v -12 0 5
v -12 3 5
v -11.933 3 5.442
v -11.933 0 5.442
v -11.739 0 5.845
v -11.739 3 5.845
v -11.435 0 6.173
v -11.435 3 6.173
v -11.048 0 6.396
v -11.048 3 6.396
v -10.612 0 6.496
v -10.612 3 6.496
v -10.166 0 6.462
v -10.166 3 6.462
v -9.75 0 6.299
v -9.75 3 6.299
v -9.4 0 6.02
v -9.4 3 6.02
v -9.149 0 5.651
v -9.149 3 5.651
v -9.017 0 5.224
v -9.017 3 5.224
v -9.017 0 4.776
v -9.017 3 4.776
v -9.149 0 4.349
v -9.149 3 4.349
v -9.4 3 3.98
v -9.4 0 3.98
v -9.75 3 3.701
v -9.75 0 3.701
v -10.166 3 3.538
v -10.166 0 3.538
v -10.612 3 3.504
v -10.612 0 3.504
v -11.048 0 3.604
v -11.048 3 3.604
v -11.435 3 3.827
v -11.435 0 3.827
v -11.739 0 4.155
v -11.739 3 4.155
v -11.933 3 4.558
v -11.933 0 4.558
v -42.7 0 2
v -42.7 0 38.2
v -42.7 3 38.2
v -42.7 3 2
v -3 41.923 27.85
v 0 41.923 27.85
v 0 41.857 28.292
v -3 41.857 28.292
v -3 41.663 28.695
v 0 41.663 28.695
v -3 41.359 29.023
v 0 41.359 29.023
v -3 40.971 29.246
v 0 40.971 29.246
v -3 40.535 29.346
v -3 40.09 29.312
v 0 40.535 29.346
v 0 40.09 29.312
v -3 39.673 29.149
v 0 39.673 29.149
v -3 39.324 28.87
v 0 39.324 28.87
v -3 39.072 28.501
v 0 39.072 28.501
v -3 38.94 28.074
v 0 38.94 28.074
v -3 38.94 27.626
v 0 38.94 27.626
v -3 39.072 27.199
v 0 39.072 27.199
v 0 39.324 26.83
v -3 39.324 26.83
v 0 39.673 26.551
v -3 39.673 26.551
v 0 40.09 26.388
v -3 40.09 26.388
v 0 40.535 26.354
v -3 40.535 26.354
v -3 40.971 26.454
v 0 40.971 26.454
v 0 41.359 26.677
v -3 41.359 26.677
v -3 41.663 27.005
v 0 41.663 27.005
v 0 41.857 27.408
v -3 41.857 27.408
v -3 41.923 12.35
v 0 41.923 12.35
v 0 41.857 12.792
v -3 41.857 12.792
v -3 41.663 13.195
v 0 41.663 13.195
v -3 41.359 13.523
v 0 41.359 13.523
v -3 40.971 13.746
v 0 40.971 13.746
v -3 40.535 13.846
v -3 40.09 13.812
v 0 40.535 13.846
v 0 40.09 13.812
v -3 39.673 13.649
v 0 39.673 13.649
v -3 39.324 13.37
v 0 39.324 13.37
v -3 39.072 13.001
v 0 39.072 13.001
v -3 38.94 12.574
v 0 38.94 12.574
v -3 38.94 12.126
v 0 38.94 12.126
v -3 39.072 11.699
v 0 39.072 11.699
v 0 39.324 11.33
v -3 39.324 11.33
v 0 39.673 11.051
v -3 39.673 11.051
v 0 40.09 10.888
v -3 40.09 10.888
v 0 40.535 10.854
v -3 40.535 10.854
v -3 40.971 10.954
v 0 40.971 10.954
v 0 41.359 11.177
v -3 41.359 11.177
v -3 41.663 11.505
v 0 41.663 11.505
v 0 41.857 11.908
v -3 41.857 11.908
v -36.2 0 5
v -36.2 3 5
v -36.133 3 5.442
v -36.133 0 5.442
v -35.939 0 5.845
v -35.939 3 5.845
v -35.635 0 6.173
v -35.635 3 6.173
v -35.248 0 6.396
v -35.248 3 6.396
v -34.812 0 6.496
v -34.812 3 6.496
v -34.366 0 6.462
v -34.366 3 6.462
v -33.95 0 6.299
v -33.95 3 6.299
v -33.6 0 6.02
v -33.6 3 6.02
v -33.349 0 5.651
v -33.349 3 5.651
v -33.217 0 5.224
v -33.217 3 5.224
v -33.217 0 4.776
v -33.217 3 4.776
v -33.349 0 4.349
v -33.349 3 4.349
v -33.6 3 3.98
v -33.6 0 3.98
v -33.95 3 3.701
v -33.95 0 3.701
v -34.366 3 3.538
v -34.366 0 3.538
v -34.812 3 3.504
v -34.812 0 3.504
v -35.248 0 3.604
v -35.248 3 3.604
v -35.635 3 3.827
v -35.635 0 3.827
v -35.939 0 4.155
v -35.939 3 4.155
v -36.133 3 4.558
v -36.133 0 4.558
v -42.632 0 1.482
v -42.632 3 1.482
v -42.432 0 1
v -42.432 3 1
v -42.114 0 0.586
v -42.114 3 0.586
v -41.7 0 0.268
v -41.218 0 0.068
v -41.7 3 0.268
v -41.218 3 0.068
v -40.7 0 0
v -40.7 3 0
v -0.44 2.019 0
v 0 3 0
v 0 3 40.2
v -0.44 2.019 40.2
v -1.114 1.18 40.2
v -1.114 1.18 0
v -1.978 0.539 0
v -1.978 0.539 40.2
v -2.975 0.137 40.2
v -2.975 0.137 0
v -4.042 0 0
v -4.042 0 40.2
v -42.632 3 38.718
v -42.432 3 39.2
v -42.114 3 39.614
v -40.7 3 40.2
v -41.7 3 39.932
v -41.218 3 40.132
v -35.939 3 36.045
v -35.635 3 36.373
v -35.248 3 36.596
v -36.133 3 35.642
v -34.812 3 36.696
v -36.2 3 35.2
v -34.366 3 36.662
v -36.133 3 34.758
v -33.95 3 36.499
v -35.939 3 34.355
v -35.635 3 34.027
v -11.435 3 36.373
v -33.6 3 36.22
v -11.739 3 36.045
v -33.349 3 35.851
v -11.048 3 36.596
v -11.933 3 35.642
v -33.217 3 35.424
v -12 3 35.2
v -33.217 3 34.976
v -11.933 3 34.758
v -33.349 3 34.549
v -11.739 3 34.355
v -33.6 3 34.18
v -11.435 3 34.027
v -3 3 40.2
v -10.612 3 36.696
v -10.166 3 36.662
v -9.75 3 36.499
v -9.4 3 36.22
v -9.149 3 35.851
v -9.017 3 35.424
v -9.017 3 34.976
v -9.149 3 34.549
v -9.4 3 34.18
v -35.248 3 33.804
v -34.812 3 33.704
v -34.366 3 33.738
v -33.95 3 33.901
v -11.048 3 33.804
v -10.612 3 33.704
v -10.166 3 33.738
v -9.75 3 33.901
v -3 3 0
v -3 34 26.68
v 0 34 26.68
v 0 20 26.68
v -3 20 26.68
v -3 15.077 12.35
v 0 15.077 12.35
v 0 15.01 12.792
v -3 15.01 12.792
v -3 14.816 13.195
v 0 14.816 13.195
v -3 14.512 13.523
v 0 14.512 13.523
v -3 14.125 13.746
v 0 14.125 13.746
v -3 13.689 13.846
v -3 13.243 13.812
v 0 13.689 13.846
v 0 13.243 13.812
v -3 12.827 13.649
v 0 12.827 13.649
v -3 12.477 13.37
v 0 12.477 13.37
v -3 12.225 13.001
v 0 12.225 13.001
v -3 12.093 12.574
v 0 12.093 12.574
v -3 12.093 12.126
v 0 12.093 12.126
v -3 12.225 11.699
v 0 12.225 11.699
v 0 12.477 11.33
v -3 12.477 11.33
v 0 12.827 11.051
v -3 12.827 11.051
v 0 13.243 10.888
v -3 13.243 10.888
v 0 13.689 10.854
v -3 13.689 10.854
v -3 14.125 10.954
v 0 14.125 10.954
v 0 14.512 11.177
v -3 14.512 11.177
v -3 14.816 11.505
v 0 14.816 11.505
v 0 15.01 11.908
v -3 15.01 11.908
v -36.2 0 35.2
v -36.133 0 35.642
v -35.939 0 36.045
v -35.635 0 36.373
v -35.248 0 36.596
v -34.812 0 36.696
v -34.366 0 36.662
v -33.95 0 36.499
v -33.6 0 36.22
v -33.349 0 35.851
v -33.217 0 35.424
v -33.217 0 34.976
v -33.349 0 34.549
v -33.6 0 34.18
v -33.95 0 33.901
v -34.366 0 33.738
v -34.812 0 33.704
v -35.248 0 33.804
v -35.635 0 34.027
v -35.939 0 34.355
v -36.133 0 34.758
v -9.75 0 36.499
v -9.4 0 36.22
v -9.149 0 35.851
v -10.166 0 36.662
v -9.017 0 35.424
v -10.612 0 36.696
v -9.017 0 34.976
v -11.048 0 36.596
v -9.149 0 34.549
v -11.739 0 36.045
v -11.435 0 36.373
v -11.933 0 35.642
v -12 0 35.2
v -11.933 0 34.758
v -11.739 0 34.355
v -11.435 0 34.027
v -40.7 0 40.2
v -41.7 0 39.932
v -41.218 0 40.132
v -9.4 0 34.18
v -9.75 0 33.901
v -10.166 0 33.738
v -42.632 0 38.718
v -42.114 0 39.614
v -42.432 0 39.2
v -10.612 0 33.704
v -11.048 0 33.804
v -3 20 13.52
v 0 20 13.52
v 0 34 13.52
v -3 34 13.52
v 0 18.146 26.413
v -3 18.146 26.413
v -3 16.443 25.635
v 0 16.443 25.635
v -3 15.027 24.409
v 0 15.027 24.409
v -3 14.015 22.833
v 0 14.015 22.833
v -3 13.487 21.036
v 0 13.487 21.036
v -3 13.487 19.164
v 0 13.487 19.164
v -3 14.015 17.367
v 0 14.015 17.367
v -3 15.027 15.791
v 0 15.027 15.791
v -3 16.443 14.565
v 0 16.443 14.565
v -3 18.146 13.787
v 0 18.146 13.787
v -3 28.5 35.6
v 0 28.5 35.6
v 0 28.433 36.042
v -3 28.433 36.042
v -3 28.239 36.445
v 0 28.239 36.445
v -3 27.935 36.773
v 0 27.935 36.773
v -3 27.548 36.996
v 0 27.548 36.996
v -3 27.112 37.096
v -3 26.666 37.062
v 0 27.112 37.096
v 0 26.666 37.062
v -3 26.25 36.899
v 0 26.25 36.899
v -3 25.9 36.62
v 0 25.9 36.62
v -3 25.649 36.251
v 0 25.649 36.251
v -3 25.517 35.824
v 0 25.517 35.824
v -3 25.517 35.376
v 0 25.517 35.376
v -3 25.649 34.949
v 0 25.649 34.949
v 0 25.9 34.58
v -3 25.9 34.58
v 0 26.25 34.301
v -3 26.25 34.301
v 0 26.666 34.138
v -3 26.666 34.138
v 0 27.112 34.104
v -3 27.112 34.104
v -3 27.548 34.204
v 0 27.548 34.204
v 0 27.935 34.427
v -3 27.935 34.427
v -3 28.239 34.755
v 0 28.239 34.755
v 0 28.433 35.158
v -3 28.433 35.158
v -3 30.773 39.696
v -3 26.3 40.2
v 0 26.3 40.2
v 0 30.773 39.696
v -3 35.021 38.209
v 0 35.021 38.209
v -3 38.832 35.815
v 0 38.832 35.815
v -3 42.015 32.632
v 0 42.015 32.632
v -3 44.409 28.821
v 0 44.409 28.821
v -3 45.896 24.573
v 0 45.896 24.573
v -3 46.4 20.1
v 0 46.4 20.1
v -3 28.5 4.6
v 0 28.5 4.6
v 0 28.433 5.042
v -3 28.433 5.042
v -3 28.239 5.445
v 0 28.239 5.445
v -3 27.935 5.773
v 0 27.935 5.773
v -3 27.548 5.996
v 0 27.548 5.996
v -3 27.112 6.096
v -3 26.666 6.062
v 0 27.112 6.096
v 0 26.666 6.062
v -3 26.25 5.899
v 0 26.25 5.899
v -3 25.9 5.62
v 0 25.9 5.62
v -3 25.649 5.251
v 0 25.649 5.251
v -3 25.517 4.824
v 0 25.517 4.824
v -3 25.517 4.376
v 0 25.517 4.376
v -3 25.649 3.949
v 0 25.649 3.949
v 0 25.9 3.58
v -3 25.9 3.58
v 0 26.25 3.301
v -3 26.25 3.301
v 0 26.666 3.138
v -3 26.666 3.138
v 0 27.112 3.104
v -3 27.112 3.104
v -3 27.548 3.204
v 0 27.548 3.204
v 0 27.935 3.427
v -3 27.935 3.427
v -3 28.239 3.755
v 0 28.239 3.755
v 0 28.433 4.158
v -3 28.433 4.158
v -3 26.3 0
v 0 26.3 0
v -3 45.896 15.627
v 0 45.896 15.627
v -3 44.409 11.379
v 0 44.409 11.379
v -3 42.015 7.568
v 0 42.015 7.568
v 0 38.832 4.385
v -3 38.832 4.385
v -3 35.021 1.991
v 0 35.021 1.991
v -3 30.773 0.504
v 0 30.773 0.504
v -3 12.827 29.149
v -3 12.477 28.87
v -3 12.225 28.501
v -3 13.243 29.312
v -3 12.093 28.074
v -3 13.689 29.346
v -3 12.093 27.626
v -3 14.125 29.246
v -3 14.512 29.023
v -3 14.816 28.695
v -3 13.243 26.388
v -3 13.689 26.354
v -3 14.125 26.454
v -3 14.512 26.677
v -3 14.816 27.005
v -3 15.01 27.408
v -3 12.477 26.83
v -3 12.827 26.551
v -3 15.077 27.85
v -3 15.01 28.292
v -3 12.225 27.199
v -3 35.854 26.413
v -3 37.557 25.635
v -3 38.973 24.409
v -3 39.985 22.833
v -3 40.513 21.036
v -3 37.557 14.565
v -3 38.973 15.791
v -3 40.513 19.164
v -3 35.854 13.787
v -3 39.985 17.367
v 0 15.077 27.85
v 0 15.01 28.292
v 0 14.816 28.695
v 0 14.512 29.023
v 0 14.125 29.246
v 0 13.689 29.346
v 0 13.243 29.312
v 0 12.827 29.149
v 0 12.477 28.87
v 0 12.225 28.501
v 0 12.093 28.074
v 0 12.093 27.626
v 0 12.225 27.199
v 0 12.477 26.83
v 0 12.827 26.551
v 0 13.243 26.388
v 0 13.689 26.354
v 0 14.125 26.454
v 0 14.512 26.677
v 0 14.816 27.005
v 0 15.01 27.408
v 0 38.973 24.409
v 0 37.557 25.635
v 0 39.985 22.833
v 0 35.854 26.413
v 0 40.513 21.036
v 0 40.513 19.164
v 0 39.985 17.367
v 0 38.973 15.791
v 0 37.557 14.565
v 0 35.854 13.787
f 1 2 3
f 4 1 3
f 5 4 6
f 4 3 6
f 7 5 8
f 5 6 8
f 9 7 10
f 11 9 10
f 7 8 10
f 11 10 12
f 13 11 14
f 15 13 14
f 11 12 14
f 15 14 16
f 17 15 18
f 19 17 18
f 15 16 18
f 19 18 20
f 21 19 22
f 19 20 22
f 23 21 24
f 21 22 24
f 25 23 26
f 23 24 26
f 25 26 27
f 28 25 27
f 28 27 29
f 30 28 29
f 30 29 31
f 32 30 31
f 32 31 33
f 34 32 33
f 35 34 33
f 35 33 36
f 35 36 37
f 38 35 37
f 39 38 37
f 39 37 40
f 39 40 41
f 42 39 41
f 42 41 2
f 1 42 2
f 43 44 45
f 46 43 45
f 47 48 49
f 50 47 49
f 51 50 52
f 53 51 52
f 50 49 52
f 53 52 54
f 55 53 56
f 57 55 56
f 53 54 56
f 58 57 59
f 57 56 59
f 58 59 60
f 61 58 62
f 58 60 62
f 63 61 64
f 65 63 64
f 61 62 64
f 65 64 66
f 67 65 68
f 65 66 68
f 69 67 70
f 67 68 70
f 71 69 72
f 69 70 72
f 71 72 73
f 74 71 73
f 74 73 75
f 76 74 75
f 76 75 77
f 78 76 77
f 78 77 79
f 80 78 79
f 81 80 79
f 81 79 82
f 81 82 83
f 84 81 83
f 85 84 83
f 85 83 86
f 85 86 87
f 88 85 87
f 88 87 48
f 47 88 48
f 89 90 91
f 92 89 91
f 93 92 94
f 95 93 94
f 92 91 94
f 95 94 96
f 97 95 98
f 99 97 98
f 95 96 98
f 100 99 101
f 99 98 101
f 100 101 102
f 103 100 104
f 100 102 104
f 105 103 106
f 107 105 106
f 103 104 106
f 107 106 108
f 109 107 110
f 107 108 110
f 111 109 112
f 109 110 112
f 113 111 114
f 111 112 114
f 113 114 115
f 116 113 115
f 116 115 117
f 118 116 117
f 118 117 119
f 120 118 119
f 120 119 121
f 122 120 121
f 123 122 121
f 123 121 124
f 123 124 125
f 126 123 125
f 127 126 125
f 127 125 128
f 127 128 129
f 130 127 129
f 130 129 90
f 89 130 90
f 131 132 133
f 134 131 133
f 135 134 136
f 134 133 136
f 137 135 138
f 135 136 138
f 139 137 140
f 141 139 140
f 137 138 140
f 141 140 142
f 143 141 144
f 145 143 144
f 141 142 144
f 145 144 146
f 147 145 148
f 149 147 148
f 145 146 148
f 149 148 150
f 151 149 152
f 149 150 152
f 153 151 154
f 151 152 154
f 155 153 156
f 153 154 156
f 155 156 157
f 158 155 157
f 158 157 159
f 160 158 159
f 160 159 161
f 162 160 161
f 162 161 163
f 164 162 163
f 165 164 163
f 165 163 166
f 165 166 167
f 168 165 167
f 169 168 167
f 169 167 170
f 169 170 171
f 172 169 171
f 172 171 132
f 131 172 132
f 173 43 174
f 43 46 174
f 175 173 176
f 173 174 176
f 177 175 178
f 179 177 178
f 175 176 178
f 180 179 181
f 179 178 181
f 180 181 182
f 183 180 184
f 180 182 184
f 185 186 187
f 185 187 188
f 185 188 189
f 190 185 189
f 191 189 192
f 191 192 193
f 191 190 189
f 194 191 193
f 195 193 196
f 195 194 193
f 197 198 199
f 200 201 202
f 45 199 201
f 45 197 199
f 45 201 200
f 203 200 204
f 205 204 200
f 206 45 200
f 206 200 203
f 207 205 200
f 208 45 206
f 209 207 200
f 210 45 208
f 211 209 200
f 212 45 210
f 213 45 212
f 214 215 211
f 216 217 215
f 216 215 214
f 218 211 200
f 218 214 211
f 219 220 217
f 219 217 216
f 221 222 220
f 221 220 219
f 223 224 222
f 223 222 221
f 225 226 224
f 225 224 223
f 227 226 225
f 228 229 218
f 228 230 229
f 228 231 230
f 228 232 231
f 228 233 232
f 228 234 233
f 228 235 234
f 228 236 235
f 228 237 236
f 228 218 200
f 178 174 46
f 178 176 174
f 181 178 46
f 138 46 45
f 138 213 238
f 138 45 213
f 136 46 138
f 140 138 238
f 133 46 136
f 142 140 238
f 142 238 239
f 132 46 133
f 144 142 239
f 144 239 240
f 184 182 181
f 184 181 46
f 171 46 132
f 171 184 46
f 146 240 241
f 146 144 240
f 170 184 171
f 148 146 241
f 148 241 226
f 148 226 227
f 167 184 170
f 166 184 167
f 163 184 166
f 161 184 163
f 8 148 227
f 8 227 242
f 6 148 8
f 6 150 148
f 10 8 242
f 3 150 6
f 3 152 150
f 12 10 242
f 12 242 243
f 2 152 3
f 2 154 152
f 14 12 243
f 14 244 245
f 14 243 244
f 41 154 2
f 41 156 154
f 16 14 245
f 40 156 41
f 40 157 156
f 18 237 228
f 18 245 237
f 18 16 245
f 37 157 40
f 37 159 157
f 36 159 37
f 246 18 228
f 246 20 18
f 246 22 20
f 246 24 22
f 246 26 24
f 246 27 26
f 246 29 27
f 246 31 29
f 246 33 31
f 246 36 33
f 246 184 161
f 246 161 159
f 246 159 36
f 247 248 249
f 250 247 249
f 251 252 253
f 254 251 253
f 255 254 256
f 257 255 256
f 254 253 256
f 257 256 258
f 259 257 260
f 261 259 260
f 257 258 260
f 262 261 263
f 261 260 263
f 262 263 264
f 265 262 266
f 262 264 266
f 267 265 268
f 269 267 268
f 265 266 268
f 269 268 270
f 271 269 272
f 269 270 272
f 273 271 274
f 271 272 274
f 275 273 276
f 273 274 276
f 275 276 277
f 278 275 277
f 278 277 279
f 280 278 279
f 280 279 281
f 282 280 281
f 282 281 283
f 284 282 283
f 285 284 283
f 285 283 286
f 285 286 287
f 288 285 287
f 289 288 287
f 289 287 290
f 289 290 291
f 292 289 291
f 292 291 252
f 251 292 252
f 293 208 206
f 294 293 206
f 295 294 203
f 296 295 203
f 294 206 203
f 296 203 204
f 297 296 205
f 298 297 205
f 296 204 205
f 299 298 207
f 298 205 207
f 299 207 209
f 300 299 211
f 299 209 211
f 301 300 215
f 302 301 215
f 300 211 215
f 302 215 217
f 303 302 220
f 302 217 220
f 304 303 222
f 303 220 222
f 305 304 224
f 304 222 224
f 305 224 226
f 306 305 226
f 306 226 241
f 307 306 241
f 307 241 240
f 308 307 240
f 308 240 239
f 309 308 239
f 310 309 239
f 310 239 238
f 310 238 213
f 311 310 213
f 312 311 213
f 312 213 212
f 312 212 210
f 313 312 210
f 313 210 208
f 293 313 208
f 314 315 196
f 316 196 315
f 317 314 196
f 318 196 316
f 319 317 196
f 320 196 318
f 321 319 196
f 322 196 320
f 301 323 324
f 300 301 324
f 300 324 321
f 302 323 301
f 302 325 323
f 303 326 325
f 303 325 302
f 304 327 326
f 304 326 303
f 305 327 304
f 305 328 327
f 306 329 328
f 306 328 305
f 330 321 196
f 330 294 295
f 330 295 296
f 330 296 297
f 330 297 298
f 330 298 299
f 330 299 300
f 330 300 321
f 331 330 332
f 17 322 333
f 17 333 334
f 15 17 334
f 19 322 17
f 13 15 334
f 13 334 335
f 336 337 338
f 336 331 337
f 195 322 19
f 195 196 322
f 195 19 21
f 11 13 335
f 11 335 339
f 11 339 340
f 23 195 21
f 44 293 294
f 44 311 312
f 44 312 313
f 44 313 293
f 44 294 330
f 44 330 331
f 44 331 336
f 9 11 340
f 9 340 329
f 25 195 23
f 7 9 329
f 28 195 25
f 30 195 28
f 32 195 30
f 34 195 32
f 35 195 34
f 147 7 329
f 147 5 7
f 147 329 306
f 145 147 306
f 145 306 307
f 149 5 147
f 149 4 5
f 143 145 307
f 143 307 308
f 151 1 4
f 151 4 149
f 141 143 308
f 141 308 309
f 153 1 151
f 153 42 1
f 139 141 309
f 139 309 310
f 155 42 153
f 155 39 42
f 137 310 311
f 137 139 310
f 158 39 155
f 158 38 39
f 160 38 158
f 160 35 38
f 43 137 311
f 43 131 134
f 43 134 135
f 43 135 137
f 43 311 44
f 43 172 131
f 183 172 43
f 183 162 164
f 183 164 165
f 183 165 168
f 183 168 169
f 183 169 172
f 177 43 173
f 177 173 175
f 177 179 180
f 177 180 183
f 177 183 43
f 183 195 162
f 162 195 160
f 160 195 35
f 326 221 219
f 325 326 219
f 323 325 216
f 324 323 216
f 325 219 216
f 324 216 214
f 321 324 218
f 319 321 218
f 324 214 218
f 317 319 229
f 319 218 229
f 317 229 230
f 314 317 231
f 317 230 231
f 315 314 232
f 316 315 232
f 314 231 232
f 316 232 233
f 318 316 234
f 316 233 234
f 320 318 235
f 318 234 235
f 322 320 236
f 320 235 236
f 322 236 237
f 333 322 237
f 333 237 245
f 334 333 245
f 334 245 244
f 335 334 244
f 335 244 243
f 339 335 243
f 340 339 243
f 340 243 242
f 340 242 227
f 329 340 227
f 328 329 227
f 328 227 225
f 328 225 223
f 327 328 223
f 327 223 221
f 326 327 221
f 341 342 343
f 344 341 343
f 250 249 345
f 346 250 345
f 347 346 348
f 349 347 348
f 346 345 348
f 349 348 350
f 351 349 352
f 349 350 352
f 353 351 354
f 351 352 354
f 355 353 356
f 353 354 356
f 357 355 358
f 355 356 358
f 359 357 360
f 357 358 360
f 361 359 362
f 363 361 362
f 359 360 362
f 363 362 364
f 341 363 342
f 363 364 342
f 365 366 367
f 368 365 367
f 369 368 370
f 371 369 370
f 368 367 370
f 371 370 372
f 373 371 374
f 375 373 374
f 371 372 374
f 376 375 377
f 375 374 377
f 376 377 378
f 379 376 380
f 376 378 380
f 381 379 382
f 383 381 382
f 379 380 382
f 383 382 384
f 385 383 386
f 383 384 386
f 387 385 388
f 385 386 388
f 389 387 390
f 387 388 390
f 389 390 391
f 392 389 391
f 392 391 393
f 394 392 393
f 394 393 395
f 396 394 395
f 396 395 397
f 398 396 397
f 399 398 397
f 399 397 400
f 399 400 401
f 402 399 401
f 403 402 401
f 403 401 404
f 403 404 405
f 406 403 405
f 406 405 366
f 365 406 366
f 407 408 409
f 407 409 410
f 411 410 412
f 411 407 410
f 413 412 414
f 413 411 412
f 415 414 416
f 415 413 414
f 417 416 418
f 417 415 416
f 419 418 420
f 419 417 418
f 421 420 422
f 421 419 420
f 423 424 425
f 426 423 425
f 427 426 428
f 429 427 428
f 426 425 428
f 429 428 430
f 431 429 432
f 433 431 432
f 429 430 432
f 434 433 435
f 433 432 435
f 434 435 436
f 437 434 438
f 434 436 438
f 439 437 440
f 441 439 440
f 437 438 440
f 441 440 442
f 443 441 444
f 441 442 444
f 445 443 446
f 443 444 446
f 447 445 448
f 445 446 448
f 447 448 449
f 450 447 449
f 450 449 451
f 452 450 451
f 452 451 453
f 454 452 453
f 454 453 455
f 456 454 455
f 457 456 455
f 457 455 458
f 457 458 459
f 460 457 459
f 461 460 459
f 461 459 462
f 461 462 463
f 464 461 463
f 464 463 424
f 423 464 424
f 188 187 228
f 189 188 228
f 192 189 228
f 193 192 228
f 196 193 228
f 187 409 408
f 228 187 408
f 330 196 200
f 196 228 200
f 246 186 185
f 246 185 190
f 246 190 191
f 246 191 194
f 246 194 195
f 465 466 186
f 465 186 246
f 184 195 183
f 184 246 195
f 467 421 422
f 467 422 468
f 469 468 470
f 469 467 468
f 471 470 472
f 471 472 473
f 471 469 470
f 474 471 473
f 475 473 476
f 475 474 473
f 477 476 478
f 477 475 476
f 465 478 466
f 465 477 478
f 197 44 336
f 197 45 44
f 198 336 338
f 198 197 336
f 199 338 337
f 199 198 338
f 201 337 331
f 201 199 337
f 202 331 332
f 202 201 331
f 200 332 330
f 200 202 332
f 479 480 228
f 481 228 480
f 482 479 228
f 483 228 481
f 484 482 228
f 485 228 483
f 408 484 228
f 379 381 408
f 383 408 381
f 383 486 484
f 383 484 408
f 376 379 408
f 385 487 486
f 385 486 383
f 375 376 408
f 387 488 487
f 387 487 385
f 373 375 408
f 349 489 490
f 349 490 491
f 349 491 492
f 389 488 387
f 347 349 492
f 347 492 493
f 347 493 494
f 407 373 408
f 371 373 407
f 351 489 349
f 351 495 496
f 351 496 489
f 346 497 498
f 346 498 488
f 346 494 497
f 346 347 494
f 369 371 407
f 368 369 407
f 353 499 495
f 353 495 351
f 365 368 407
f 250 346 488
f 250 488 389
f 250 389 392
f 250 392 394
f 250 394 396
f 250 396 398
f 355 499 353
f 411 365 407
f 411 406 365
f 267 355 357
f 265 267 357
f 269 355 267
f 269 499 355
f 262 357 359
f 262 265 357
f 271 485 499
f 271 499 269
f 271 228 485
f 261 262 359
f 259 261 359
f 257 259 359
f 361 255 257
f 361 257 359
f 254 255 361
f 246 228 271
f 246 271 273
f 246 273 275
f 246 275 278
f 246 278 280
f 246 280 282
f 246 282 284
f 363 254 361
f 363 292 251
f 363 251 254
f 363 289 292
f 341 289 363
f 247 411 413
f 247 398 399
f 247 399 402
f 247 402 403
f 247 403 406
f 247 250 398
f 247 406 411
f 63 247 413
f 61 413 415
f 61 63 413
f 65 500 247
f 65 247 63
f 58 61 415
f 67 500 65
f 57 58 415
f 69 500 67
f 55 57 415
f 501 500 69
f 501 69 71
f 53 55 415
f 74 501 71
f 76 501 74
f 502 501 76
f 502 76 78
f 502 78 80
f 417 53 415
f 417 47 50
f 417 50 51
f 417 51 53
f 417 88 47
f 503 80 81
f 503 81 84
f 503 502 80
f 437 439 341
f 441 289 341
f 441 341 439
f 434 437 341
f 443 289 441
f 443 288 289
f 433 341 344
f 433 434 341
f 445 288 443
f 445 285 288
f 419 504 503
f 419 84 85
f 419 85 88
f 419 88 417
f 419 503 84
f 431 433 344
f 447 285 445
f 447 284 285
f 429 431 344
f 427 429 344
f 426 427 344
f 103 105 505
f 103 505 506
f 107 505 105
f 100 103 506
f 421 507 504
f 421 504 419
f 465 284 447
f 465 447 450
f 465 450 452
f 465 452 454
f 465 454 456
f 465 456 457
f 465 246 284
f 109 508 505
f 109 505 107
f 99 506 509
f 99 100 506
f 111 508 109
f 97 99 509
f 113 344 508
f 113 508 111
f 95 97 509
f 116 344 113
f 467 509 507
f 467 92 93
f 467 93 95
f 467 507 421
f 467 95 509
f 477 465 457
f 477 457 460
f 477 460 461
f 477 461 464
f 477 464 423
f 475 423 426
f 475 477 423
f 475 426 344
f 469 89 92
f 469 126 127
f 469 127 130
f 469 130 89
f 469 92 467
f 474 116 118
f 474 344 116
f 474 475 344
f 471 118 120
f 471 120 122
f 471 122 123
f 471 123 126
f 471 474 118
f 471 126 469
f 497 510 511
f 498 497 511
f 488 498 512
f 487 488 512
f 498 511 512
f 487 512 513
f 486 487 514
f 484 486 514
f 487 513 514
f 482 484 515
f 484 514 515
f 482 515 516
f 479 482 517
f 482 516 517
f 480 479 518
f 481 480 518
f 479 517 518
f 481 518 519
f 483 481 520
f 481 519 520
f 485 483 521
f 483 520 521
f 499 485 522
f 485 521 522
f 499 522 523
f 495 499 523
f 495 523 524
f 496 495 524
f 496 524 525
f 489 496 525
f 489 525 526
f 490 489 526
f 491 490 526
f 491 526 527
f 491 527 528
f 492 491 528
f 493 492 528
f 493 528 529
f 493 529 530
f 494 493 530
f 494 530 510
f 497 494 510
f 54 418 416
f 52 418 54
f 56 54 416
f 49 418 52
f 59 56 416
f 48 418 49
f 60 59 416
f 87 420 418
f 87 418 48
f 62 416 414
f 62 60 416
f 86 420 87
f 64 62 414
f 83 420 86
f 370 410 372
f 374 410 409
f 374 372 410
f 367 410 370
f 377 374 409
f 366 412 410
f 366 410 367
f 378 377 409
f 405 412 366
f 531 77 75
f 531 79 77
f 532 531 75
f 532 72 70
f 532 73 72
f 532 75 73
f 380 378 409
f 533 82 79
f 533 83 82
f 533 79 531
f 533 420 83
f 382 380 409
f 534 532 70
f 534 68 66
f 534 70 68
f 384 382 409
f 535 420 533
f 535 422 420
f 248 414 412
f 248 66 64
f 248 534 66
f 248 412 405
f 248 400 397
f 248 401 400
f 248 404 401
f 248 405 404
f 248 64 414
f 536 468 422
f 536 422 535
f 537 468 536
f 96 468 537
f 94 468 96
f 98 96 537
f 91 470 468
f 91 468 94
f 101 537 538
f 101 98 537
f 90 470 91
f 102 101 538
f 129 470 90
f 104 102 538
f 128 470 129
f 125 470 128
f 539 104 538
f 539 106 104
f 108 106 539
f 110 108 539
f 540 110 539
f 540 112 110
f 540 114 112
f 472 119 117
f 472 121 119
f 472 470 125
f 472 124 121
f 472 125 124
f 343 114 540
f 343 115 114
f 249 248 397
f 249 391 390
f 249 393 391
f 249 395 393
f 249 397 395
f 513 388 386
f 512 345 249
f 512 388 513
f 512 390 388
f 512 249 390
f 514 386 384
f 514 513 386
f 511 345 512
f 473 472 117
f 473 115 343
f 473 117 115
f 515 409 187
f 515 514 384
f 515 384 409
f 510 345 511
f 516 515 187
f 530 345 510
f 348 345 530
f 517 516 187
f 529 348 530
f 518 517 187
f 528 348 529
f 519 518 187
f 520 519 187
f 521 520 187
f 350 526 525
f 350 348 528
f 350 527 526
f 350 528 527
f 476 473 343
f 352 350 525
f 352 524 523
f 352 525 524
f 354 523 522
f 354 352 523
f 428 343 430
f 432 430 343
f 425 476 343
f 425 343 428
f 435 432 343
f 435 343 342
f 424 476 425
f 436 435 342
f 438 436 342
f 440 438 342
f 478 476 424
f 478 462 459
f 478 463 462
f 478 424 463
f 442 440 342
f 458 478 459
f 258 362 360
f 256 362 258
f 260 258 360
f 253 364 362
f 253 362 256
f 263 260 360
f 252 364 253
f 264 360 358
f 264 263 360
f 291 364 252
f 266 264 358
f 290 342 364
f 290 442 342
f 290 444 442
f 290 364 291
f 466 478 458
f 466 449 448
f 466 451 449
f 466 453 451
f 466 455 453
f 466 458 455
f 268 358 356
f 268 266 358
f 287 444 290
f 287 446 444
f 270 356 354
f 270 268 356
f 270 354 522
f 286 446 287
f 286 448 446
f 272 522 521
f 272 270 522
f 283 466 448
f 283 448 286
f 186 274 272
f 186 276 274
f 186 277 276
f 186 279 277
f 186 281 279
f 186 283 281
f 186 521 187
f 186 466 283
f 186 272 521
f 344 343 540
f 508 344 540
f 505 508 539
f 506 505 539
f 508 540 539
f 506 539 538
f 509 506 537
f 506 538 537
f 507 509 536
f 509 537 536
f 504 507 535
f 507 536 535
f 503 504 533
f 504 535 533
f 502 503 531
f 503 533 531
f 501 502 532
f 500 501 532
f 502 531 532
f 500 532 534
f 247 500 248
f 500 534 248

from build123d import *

# Parameters (mm, degrees)
BOSS_EXTRUDE1_DEPTH = 40.2
CUT_EXTRUDE1_START  = -3
CUT_EXTRUDE1_DEPTH  = 3
CUT_EXTRUDE4_DEPTH  = 40
SKETCH8_R           = 1.5
CUT_EXTRUDE5_DEPTH  = 40
FILLET2_R           = 2
SKETCH5_R           = 1.5
CUT_EXTRUDE6_DEPTH  = 73.958138682


# Read off the part's stored shape, not the designer's step: Cut-Extrude1
with BuildPart() as part:
    # Sketch1 → Boss-Extrude1 (new body)
    with BuildSketch(Plane.XY):
        with BuildLine():
            Line((-4.042288133, 0), (-42.7, 0))
            Line((-42.7, 0), (-42.7, 3))
            Line((-42.7, 3), (-3, 3))
            Line((-3, 3), (-3, 46.4))
            Line((-3, 46.4), (0, 46.4))
            Line((0, 46.4), (0, 3))
            ThreePointArc((0, 3), (-1.525340907, 0.831940258), (-4.042288133, 0))
        make_face()
    extrude(amount=BOSS_EXTRUDE1_DEPTH)

    # Cut-Extrude1 outline → Cut-Extrude1 (cut)
    with BuildSketch(Plane(origin=(0, 0, 0), x_dir=(0, 0, -1), z_dir=(1, 0, 0)).offset(CUT_EXTRUDE1_START)):
        with BuildLine():
            ThreePointArc((-40.2, 26.3), (-34.312846302, 40.512846302), (-20.1, 46.4))
            Line((-20.1, 46.4), (-40.2, 46.4))
            Line((-40.2, 46.4), (-40.2, 26.3))
        make_face()
        with BuildLine():
            ThreePointArc((-20.1, 46.4), (-5.887153698, 40.512846302), (0, 26.3))
            Line((0, 26.3), (0, 46.4))
            Line((0, 46.4), (-20.1, 46.4))
        make_face()
    extrude(amount=CUT_EXTRUDE1_DEPTH, mode=Mode.SUBTRACT)

    # Sketch7 → Cut-Extrude4 (cut)
    with BuildSketch(Plane(origin=(0, 0, 0), x_dir=(0, 0, -1), z_dir=(1, 0, 0))):
        with BuildLine():
            Line((-26.68, 34), (-26.68, 20))
            ThreePointArc((-26.68, 20), (-20.1, 13.42), (-13.52, 20))
            Line((-13.52, 20), (-13.52, 34))
            ThreePointArc((-13.52, 34), (-20.1, 40.58), (-26.68, 34))
        make_face()
    extrude(amount=-CUT_EXTRUDE4_DEPTH, mode=Mode.SUBTRACT)

    # Sketch8 → Cut-Extrude5 (cut)
    with BuildSketch(Plane(origin=(0, 0, 0), x_dir=(0, 0, -1), z_dir=(1, 0, 0))):
        with Locations(Location((-35.6, 27, 0), (0, 0, 90))):
            Circle(SKETCH8_R)
        with Locations(Location((-27.85, 40.423393759, 0), (0, 0, 90))):
            Circle(SKETCH8_R)
        with Locations(Location((-12.35, 40.423393759, 0), (0, 0, 90))):
            Circle(SKETCH8_R)
        with Locations(Location((-4.6, 27, 0), (0, 0, 90))):
            Circle(SKETCH8_R)
        with Locations(Location((-12.35, 13.576606241, 0), (0, 0, 90))):
            Circle(SKETCH8_R)
        with Locations(Location((-27.85, 13.576606241, 0), (0, 0, 90))):
            Circle(SKETCH8_R)
    extrude(amount=-CUT_EXTRUDE5_DEPTH, mode=Mode.SUBTRACT)

    # Fillet2
    fillet2_edges = [part.edges().sort_by_distance(p)[0] for p in [
        (-42.7, 1.5, 40.2),
        (-42.7, 1.5, 0),
    ]]
    fillet(fillet2_edges, radius=FILLET2_R)

    # Sketch5 → Cut-Extrude6 (cut, through all)
    with BuildSketch(Plane(origin=(0, 3, 0), x_dir=(1, 0, 0), z_dir=(0, 1, 0))):
        with Locations(Location((-10.5, -5, 0), (0, 0, 180))):
            Circle(SKETCH5_R)
        with Locations(Location((-10.5, -35.2, 0), (0, 0, 180))):
            Circle(SKETCH5_R)
        with Locations(Location((-34.7, -35.2, 0), (0, 0, 180))):
            Circle(SKETCH5_R)
        with Locations(Location((-34.7, -5, 0), (0, 0, 180))):
            Circle(SKETCH5_R)
    extrude(amount=-CUT_EXTRUDE6_DEPTH, mode=Mode.SUBTRACT)


solid = part.part
